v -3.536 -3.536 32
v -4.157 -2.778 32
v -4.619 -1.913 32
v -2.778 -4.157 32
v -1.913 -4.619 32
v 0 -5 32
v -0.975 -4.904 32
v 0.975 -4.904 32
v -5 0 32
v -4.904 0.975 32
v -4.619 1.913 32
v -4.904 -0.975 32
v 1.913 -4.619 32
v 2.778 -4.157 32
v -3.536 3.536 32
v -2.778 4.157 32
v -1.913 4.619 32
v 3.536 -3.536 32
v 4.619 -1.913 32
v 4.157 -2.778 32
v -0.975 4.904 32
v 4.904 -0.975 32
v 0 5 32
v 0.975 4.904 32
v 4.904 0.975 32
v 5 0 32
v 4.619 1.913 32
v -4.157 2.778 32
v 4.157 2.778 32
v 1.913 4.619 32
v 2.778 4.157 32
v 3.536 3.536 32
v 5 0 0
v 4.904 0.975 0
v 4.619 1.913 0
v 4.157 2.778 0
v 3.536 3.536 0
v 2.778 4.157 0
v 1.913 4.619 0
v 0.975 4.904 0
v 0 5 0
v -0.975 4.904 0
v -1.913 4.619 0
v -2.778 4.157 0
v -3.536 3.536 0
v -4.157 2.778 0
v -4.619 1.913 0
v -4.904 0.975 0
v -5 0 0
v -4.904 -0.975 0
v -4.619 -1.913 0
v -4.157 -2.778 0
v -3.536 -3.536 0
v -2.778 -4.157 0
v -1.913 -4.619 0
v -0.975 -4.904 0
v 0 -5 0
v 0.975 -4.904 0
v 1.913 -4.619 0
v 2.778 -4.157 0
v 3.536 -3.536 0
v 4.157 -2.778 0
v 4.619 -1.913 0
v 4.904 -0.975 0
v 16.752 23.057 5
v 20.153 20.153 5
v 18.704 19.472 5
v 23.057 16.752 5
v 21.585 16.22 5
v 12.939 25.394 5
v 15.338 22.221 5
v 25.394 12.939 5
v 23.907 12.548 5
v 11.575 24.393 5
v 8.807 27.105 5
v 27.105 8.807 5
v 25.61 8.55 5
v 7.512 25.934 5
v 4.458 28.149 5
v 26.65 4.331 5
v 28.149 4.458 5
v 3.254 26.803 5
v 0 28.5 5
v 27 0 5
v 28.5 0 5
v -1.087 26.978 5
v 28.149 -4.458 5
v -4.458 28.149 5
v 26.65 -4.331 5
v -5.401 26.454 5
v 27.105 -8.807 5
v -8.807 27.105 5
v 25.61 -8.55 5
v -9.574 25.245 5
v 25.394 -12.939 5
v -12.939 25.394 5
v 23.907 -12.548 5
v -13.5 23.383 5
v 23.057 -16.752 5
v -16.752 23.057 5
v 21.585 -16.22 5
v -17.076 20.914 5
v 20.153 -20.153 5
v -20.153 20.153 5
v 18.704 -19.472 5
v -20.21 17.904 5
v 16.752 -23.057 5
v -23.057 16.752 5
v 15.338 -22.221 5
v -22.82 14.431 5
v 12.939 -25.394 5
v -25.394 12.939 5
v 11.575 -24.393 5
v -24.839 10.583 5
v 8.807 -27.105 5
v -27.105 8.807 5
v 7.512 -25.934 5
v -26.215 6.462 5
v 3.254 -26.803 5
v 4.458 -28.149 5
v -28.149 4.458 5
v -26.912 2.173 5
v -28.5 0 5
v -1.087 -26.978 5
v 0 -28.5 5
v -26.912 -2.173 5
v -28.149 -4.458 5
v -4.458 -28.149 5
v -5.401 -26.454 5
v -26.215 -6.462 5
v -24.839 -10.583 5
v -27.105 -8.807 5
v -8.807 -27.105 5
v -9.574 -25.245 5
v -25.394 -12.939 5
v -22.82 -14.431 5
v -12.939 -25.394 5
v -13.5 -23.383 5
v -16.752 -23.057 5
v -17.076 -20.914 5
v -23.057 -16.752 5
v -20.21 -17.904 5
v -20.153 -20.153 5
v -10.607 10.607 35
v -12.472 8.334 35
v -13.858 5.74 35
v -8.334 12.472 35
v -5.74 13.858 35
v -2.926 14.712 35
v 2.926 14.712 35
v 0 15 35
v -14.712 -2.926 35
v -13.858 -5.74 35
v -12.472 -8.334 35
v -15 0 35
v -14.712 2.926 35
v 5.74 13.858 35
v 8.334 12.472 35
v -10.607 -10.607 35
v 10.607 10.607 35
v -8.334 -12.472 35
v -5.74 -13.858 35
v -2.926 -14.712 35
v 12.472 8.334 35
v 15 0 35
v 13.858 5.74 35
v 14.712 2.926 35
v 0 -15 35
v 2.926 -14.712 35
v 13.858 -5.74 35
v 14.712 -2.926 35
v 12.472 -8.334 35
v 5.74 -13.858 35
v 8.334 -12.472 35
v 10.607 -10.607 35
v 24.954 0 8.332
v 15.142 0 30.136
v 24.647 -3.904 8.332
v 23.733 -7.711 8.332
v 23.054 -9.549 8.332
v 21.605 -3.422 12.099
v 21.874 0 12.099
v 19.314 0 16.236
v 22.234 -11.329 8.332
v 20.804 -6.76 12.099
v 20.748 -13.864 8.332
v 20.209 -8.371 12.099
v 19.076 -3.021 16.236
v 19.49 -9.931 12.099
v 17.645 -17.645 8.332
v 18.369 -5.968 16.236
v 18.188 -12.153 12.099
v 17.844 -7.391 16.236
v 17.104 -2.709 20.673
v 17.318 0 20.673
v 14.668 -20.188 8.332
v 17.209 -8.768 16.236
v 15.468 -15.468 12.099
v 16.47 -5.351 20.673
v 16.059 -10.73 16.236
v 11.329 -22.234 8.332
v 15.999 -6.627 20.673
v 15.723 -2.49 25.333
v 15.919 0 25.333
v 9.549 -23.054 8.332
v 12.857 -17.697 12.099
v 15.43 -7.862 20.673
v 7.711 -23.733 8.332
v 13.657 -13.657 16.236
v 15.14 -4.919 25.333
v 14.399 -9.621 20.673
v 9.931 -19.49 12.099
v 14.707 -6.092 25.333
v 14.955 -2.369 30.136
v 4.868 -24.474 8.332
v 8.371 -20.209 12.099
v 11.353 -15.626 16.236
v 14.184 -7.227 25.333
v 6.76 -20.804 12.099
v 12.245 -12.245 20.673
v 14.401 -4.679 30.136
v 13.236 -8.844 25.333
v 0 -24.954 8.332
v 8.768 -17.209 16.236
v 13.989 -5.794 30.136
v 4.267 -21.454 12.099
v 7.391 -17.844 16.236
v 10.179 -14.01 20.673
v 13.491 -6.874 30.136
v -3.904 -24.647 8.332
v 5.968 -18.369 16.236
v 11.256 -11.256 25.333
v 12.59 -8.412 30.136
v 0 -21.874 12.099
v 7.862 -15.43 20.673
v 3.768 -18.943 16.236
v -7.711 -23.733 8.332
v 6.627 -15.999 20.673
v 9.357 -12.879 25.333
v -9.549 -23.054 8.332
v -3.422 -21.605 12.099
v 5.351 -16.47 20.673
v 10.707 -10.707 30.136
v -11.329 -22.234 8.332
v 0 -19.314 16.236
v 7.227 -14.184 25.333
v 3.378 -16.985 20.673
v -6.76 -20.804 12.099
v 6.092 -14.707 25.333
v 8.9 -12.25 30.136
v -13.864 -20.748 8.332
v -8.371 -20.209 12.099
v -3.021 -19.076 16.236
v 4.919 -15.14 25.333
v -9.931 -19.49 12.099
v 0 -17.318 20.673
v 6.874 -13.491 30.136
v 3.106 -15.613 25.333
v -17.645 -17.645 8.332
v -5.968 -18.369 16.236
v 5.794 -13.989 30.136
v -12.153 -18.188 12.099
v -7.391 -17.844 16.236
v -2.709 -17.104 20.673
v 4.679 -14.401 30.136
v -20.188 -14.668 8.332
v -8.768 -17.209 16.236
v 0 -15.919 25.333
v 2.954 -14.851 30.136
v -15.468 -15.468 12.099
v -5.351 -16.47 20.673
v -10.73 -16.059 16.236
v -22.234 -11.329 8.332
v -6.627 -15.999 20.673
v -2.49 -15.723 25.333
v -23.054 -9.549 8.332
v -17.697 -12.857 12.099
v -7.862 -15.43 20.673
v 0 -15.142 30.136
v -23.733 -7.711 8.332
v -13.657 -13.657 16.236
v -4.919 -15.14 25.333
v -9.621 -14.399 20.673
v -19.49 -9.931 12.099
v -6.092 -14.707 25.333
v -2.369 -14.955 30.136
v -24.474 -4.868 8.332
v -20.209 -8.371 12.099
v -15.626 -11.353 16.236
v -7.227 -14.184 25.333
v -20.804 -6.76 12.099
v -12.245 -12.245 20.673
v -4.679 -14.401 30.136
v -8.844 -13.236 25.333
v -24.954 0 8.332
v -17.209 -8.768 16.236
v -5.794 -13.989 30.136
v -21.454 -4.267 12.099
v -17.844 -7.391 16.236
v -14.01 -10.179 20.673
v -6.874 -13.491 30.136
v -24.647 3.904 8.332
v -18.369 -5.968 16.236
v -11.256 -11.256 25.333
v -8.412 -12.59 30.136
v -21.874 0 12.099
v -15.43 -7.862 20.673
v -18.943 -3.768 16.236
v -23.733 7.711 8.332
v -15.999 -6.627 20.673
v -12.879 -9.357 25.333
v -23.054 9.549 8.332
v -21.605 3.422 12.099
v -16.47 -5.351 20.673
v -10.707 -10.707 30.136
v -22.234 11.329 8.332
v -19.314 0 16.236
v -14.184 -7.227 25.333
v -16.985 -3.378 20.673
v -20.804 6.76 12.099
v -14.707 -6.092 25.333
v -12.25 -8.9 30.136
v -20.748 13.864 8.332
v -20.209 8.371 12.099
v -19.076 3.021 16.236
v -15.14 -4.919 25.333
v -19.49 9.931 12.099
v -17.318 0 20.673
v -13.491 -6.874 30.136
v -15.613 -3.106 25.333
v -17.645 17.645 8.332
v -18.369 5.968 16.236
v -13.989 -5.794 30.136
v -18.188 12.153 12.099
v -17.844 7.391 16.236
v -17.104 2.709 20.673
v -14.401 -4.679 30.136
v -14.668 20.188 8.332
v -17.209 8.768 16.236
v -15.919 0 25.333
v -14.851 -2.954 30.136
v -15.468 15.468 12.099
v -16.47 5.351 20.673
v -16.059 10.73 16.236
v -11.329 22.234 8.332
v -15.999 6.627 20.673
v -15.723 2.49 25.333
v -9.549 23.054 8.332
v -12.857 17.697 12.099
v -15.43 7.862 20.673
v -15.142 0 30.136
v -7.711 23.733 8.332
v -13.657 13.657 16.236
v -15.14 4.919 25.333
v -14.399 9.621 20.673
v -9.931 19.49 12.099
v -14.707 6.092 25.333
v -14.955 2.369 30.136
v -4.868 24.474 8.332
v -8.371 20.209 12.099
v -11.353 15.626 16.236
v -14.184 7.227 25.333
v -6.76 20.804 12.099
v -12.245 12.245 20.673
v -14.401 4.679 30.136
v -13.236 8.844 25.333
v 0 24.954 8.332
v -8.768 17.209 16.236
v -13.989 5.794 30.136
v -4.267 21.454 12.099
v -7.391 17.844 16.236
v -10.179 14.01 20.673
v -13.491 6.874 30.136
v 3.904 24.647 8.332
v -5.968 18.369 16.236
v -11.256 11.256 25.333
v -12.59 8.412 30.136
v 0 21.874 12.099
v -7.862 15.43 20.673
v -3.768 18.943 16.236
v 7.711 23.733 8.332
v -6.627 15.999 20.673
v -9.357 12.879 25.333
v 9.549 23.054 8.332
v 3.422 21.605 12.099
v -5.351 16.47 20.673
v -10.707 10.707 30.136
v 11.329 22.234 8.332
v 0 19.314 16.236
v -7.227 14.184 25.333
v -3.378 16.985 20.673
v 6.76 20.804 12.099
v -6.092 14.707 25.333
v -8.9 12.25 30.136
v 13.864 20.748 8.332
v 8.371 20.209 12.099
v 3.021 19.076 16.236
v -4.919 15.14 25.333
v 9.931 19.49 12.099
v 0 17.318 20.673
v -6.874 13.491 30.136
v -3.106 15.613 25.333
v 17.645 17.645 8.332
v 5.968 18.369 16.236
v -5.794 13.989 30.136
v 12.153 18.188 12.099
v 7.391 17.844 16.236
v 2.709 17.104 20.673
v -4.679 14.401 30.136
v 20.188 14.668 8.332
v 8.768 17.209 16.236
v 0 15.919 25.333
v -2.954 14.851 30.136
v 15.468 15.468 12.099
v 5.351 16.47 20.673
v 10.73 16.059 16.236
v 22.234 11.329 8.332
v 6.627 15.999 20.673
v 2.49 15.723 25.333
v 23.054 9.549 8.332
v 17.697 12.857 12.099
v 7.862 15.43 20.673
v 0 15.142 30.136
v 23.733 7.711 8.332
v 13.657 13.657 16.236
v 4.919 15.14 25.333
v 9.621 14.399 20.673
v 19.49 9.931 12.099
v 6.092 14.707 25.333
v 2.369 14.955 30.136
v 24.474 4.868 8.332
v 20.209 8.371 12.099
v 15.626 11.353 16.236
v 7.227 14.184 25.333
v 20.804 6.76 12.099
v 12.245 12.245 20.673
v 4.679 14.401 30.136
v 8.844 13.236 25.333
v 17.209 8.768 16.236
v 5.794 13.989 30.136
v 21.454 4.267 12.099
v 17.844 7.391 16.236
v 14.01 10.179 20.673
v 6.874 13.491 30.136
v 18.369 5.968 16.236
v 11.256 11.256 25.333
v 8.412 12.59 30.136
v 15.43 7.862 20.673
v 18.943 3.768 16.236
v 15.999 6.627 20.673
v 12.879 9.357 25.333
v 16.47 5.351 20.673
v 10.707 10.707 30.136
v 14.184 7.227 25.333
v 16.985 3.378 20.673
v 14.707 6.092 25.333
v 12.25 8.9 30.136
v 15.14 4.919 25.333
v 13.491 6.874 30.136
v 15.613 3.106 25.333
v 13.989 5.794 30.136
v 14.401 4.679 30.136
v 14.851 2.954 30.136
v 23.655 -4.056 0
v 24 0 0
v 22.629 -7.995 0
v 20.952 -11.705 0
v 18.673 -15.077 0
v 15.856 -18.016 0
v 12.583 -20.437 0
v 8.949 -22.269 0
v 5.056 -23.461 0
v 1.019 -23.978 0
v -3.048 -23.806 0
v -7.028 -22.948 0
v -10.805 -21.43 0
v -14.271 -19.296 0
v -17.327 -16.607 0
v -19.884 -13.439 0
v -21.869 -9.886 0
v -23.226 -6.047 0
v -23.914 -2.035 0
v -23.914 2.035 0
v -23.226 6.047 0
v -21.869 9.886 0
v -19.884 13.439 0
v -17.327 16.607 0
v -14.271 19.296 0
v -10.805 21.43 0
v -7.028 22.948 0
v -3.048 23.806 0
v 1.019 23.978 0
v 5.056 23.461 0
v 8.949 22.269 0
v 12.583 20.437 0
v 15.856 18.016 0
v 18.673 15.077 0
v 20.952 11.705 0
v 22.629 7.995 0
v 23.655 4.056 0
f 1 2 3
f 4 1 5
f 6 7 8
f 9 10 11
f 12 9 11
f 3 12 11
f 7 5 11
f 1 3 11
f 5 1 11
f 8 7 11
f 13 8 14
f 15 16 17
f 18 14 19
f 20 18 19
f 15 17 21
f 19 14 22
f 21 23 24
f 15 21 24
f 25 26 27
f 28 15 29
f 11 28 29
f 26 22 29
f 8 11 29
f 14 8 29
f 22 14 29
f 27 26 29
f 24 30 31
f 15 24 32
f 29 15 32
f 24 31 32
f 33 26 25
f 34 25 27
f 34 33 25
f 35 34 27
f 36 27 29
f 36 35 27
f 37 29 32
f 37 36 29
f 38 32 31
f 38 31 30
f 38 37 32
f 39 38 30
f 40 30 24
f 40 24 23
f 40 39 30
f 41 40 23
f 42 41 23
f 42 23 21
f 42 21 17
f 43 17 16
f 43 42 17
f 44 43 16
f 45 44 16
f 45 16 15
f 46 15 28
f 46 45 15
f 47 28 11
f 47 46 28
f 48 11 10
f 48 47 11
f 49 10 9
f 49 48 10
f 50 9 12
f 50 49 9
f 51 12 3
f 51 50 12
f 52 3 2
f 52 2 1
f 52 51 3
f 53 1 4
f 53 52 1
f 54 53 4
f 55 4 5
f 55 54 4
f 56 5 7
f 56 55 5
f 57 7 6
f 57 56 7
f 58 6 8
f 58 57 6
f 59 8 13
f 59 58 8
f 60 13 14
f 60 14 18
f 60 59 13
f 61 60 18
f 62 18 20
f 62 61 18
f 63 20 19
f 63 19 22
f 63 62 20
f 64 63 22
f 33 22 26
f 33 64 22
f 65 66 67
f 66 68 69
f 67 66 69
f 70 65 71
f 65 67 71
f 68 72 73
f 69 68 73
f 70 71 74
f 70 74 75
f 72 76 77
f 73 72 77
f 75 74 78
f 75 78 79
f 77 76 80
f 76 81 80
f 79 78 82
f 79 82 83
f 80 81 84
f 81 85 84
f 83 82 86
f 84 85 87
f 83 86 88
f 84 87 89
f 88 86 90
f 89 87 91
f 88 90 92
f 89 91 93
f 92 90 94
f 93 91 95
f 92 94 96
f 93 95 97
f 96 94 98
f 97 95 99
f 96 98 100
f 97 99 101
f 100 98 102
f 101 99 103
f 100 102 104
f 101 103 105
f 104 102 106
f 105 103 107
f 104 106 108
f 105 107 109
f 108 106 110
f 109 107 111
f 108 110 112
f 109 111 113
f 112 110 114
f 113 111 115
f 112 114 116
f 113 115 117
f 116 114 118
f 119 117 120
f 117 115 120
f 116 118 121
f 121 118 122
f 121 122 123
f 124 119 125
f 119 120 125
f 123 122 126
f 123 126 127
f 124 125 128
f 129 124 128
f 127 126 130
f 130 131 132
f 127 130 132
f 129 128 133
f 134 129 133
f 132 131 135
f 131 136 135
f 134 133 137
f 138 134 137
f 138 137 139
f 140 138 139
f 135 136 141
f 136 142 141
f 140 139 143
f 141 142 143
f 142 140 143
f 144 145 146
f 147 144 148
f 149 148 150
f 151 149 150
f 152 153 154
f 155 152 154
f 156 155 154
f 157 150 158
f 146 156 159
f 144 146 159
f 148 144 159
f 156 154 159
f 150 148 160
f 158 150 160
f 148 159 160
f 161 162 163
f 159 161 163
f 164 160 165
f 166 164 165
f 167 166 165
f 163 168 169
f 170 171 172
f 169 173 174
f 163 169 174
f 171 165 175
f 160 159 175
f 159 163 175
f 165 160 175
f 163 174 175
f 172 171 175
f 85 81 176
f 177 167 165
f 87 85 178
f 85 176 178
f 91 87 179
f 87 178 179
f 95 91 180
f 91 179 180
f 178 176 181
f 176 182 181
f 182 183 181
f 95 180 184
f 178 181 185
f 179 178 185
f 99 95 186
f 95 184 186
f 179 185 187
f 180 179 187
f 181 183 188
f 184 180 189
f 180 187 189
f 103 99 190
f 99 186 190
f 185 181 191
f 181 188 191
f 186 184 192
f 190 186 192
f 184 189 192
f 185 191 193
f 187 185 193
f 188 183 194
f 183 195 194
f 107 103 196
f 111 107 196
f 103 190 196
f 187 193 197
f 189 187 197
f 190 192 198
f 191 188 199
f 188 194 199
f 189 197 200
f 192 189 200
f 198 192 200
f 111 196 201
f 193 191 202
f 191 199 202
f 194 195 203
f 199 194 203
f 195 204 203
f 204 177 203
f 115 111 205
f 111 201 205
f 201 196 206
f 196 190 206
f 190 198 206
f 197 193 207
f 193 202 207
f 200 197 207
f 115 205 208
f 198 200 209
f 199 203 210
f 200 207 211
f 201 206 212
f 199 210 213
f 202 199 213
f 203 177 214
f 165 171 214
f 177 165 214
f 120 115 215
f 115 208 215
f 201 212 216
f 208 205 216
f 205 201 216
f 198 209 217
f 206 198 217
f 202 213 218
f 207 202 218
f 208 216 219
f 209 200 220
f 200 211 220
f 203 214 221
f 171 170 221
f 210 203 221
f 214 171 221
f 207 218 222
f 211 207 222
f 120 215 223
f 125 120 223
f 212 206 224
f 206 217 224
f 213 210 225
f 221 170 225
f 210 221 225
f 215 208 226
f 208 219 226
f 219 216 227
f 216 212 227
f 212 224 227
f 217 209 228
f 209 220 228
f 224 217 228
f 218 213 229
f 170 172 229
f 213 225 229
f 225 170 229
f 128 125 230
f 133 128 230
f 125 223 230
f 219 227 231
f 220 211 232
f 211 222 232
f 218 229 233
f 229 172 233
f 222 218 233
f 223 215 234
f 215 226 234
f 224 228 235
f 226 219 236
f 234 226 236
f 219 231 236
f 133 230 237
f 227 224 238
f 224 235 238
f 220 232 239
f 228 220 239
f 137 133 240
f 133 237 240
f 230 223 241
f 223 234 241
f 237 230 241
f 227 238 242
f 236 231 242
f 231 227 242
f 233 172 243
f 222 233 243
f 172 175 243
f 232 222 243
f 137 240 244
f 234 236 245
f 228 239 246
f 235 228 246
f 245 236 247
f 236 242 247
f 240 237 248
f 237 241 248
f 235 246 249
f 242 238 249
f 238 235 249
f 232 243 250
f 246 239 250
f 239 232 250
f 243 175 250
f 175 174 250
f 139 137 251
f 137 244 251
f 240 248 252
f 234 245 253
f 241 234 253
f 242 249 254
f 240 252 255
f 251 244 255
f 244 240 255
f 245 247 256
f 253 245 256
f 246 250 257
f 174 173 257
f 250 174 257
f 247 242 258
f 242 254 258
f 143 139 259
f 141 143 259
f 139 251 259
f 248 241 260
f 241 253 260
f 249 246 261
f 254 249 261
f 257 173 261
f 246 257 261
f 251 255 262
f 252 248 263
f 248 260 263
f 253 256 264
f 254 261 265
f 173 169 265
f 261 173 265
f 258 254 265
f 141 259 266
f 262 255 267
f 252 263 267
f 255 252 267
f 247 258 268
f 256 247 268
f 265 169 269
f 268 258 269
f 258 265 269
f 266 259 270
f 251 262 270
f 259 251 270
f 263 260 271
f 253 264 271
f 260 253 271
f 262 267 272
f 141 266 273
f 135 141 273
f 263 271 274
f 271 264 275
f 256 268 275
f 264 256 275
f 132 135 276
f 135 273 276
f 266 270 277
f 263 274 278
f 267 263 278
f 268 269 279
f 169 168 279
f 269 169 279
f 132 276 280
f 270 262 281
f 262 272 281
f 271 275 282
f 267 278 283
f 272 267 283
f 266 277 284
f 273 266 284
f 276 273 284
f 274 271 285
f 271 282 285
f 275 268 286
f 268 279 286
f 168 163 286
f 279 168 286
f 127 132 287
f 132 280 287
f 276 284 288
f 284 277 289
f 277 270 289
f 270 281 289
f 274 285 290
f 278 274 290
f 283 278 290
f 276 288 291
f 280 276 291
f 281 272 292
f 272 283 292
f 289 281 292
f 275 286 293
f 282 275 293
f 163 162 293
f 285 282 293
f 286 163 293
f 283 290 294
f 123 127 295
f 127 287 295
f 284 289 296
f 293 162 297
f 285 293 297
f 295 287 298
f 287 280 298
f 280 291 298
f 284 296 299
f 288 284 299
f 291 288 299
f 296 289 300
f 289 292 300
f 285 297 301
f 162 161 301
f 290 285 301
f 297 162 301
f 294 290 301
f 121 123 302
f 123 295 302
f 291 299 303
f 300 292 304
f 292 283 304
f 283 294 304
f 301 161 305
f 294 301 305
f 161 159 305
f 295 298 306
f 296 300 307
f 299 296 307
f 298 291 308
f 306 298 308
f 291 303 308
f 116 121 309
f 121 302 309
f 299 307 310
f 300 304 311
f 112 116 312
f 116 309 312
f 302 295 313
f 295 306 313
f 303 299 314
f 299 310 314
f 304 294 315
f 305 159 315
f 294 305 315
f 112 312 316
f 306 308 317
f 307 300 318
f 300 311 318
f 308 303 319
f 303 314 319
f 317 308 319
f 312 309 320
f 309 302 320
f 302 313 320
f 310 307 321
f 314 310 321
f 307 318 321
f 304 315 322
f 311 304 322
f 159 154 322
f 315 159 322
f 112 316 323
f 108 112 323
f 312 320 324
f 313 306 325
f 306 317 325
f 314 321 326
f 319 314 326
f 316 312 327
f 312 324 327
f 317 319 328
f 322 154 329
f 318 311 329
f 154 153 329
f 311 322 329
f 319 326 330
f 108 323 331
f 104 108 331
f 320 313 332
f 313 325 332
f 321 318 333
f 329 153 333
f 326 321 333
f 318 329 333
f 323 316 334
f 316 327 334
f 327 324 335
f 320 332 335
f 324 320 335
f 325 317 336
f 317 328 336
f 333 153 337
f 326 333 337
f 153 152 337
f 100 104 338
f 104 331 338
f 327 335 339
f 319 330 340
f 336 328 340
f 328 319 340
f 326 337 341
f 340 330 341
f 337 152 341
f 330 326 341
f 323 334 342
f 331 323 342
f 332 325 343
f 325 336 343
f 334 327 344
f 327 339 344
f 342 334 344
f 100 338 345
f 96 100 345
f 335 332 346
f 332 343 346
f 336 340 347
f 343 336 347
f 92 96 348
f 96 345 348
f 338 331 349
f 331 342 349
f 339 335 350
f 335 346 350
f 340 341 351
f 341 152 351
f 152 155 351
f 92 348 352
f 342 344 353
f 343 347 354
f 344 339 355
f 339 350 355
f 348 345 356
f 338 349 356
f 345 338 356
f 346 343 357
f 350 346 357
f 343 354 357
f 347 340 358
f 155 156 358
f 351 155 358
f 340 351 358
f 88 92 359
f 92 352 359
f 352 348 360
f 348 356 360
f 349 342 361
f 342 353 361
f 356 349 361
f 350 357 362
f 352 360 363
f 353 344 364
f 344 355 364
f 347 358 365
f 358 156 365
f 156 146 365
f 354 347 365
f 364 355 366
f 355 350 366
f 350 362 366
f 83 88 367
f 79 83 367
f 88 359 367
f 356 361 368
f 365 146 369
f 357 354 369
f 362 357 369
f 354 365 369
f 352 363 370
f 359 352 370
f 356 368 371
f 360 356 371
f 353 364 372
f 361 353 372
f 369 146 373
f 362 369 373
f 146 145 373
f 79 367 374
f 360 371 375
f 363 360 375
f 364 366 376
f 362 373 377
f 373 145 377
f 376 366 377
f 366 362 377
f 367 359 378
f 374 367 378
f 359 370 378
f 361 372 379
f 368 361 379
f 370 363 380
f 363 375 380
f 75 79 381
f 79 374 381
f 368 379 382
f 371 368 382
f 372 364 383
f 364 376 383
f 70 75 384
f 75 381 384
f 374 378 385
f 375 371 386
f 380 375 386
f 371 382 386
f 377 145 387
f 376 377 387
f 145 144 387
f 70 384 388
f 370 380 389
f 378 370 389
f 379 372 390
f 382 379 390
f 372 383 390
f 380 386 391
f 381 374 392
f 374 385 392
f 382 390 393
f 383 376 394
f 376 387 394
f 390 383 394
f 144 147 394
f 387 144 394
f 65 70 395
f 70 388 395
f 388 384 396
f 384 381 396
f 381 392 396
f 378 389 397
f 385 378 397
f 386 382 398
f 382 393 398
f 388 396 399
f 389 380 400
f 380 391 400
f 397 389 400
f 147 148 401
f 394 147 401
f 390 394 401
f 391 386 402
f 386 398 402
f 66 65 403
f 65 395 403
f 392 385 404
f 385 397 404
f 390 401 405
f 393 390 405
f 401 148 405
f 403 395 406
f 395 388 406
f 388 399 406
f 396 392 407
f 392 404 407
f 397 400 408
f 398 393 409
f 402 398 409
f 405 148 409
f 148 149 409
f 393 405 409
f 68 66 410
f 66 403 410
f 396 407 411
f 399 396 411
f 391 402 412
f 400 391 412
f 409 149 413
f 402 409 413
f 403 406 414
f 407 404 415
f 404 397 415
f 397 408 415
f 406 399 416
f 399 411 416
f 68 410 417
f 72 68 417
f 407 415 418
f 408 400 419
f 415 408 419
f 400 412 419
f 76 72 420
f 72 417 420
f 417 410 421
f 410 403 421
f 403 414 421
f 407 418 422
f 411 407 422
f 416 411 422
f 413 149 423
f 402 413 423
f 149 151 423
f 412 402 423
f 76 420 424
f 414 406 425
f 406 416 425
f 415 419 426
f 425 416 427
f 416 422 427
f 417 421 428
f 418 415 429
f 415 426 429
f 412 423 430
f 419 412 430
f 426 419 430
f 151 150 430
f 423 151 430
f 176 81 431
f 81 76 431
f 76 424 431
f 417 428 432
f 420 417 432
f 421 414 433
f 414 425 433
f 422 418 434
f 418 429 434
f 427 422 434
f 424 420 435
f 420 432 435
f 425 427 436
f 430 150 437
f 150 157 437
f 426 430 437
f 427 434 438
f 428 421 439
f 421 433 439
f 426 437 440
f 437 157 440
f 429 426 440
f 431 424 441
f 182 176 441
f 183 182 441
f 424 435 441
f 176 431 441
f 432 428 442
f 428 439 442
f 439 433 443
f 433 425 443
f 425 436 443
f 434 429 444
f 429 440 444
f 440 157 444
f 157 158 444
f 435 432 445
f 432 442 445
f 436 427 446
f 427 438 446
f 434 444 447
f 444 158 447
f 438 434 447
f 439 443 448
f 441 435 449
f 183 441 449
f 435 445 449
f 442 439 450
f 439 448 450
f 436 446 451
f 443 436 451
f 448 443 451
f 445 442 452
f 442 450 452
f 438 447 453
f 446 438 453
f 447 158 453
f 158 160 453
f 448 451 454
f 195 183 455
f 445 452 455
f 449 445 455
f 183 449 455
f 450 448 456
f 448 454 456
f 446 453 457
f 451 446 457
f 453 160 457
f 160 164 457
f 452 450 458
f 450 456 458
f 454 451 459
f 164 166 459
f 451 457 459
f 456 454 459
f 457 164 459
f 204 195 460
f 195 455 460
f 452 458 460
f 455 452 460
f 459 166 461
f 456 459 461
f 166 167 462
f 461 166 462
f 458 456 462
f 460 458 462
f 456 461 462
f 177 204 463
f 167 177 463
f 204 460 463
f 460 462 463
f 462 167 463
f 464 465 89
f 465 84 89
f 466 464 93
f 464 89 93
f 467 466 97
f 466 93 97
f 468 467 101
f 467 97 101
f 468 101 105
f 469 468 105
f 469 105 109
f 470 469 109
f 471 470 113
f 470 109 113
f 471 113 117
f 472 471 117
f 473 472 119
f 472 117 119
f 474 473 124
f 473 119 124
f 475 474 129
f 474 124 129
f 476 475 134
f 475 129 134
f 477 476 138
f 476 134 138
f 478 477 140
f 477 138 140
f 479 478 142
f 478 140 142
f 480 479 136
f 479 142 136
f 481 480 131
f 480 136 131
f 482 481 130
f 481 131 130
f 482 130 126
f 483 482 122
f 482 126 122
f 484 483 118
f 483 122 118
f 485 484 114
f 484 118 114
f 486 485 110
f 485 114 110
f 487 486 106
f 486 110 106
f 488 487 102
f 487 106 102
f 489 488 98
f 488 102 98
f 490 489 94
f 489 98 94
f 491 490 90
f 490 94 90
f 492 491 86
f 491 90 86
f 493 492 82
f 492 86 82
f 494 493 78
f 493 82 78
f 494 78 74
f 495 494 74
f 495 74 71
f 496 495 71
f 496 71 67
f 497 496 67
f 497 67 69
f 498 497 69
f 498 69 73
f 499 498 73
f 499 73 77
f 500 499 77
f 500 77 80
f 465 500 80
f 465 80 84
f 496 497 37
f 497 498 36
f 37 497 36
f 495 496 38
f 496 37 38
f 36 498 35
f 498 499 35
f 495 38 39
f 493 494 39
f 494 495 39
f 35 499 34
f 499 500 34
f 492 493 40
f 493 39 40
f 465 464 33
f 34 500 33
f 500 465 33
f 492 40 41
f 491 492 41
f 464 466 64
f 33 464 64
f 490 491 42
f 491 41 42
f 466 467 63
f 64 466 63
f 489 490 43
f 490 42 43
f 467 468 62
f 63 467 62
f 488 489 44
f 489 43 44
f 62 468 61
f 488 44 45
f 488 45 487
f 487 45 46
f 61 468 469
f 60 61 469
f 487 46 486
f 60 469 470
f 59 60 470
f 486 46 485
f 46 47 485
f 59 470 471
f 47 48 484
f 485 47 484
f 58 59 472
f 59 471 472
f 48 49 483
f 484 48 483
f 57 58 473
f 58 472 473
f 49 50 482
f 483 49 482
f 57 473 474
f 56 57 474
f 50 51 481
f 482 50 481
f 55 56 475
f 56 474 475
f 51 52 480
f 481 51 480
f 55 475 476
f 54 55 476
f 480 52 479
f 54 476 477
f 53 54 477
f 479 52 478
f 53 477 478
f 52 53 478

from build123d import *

# Parameters (mm, degrees)
F2_R     = 5
F3_DEPTH = 32


with BuildPart() as f1:
    # F0 (on Front) → F1 (revolve)
    with BuildSketch(Plane.XZ):
        with BuildLine():
            Line((0, 35), (0, 0))
            Line((0, 0), (24, 0))
            Line((24, 0), (27, 5))
            Line((27, 5), (28.5, 5))
            ThreePointArc((28.5, 5), (18.243075, 18.421884), (15, 35))
            Line((15, 35), (0, 35))
        make_face()
    revolve(axis=Axis((0, 0, 17.5), (0, 0, -1)))


with BuildPart() as f3:
    # F2 (on Top) → F3 (new body)
    with BuildSketch(Plane.XY):
        Circle(F2_R)
    extrude(amount=F3_DEPTH)


with BuildPart() as f1_1:
    add(f1.part)

    # F4: cut F3
    add(f3.part, mode=Mode.SUBTRACT)


solid = f1_1.part
